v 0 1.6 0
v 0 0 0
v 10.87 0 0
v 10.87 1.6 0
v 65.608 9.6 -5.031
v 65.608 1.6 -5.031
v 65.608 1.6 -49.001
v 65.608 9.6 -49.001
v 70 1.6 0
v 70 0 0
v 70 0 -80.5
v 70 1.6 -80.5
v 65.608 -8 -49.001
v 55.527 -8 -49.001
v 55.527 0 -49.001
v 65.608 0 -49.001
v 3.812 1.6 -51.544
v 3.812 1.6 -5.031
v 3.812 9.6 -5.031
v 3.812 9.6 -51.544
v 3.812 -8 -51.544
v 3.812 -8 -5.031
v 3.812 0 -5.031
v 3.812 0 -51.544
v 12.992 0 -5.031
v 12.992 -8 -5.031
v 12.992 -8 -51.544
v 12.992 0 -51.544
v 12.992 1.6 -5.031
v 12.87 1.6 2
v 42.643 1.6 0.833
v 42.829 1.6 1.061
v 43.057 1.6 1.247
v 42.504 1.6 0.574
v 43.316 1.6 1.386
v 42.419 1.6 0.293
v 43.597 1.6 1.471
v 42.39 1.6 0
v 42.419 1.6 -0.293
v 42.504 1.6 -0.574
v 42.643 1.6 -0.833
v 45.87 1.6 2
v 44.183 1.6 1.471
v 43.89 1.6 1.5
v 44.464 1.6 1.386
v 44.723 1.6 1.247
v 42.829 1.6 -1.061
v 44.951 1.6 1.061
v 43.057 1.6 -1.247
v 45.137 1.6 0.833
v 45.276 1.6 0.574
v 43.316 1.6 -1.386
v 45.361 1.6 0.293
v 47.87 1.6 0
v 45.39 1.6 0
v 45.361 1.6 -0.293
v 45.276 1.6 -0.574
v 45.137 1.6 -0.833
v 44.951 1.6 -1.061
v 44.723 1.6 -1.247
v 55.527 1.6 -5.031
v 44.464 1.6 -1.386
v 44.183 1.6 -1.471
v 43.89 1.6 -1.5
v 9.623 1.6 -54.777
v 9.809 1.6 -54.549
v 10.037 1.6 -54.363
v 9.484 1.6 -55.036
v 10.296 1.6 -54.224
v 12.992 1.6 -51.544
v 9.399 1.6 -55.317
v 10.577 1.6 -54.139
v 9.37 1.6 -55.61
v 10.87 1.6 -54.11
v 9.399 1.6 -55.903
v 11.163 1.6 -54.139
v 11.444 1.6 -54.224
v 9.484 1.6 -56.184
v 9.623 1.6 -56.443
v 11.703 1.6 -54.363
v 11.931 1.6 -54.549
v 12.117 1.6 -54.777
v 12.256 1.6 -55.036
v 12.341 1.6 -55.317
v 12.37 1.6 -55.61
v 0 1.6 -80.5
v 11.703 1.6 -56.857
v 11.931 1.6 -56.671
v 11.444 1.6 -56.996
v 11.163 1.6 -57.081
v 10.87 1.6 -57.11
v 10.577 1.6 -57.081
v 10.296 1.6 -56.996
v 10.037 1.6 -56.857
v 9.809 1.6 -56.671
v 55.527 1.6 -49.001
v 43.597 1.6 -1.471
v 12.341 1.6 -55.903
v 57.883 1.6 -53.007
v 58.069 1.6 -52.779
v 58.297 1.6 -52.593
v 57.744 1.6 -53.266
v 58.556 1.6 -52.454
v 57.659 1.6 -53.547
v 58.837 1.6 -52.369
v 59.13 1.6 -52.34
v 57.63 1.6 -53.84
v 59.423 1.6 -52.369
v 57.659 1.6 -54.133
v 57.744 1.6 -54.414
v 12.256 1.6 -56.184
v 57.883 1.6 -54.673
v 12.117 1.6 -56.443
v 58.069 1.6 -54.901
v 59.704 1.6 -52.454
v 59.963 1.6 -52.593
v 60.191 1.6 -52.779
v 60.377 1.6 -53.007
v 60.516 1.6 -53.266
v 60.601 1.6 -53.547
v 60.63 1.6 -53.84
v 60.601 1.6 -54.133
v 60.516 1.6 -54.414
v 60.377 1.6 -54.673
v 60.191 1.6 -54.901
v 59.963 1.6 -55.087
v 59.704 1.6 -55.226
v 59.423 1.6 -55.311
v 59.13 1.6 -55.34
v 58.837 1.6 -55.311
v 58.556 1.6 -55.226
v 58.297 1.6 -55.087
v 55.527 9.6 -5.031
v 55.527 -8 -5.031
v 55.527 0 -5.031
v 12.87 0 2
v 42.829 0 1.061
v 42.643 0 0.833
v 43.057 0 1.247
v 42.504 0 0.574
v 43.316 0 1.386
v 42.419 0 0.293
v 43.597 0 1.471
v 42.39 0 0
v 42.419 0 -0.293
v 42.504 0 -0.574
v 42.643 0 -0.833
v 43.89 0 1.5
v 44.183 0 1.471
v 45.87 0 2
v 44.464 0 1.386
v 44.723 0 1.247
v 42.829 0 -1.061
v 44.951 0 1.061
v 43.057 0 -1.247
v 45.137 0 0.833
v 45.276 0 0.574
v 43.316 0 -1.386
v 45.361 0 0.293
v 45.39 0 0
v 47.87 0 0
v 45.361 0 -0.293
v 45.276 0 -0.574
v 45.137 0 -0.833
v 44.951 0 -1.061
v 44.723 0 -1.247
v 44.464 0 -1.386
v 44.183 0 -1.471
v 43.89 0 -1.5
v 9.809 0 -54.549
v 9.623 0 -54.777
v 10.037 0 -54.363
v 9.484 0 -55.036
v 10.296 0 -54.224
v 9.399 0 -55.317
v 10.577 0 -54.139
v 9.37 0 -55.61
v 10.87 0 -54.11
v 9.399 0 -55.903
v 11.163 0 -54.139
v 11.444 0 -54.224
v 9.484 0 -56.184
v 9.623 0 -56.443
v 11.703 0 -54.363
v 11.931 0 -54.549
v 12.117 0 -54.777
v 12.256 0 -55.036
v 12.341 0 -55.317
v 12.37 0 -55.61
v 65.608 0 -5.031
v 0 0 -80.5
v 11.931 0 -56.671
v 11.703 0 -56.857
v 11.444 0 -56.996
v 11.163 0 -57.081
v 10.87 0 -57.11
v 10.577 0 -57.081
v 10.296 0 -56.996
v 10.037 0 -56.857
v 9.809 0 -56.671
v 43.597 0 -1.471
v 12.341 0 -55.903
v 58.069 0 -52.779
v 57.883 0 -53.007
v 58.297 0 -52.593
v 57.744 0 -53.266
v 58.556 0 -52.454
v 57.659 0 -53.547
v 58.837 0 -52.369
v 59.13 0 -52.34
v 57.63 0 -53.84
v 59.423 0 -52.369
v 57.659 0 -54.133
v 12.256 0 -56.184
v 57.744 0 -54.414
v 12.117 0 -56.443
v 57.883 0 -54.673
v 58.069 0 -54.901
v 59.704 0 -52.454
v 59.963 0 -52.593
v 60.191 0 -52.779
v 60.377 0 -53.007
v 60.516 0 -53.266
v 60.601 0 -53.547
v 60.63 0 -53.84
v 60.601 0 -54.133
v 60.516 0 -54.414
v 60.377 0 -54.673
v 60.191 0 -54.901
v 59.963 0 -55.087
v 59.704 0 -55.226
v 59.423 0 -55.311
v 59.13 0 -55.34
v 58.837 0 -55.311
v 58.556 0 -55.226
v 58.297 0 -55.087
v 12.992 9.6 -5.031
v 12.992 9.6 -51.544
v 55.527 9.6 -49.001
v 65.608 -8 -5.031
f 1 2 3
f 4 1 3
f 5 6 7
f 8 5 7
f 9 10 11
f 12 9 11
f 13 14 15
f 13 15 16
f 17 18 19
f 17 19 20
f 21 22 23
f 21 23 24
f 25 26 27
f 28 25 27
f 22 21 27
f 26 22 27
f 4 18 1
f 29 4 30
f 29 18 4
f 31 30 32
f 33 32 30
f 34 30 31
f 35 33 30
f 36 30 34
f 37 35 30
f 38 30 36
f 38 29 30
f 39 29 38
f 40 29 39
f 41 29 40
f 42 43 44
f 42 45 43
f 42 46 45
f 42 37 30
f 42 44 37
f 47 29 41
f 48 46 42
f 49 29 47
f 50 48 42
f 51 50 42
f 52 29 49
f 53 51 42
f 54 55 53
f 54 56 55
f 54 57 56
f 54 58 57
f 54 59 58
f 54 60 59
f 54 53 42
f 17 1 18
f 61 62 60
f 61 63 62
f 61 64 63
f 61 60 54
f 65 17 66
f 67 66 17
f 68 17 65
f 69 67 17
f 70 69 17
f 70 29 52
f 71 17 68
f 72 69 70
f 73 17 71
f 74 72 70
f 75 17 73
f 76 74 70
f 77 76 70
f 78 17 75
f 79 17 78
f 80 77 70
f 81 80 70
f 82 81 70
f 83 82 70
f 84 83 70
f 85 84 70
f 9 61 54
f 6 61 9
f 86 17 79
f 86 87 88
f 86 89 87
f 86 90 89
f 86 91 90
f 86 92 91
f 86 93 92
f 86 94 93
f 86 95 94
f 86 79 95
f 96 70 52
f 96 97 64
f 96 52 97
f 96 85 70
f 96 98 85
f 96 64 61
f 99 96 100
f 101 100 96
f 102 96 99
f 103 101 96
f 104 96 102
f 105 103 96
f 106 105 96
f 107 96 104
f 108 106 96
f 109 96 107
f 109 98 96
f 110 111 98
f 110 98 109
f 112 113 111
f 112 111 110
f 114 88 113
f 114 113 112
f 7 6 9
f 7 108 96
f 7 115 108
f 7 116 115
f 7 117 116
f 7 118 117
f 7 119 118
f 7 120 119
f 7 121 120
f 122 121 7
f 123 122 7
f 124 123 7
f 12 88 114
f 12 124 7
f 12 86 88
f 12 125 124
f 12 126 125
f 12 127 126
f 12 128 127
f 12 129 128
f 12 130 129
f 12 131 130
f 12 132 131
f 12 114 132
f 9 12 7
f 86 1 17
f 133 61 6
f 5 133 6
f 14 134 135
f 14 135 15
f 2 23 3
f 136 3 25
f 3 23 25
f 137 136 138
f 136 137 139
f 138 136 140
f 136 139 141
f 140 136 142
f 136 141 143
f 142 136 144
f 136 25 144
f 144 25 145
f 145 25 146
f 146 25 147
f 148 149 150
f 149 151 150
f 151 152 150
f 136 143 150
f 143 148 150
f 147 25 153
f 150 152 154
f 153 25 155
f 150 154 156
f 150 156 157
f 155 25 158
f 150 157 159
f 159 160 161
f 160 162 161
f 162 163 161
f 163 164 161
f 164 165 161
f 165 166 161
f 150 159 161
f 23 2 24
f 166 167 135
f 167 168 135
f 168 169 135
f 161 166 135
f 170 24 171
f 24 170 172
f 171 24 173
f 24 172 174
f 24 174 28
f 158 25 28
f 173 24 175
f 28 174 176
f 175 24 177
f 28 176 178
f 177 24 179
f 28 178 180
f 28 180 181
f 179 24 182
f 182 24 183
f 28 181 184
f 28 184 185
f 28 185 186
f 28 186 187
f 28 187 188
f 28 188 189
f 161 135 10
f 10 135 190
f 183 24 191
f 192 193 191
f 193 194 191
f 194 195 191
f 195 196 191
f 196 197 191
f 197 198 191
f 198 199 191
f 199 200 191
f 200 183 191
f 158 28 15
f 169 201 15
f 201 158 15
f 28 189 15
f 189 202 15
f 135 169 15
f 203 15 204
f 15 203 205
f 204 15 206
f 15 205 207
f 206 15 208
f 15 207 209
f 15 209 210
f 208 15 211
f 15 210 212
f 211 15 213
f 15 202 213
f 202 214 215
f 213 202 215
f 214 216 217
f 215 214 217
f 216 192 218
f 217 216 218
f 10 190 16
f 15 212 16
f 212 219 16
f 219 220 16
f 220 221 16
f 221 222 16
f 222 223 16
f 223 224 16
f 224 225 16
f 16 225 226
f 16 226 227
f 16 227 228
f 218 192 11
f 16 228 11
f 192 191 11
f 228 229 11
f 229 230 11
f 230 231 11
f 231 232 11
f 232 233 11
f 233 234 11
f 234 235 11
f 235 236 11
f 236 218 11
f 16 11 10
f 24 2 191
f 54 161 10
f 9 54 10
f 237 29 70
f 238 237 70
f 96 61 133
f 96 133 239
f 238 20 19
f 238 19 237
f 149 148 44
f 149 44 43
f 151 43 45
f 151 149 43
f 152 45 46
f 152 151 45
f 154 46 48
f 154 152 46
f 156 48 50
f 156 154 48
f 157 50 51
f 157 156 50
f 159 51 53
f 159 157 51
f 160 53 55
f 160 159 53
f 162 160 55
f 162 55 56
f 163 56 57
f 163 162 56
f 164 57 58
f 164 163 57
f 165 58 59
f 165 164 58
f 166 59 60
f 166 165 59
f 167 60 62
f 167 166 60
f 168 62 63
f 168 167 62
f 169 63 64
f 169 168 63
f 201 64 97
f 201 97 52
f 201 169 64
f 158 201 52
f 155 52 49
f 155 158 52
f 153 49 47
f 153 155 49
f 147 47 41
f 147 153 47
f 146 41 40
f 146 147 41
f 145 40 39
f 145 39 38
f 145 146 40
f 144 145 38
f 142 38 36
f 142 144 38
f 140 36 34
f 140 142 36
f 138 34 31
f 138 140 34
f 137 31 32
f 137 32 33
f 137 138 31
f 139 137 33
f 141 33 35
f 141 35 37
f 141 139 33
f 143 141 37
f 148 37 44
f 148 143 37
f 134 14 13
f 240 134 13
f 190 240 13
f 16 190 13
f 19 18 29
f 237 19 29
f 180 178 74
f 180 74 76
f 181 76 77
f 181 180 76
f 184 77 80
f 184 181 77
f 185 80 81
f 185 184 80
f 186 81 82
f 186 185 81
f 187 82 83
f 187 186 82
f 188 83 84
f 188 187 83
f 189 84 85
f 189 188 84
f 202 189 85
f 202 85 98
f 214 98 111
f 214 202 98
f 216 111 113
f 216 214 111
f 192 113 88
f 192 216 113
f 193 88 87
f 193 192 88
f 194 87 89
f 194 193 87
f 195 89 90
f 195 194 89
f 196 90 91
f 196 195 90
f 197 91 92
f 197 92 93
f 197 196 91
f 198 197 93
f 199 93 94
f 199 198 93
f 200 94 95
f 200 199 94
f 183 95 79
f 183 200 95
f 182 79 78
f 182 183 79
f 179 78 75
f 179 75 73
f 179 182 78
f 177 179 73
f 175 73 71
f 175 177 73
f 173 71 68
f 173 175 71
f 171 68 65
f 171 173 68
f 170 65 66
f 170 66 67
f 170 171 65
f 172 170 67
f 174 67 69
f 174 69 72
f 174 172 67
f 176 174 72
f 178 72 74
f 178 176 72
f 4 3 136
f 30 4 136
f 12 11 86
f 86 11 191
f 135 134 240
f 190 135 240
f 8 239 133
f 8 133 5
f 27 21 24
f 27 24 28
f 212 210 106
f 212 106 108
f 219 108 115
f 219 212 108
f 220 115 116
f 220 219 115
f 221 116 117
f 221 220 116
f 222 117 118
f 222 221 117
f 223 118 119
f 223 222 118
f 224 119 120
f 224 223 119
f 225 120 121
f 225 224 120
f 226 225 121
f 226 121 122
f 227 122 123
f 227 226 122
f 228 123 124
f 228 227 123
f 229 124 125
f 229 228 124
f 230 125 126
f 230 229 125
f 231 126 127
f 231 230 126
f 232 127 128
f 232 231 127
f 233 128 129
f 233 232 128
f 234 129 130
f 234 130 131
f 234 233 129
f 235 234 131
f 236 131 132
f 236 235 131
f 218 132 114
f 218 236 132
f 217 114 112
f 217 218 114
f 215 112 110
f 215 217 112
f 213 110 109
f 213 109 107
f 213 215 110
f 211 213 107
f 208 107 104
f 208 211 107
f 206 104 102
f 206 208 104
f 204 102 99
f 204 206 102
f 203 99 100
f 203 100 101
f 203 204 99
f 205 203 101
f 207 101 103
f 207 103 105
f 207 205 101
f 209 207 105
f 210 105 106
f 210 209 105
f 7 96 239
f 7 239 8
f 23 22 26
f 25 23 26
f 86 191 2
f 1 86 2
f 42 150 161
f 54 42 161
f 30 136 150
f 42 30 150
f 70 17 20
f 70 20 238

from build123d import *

# Parameters (mm, degrees)
SKETCH1_R                = 1.5
BOSS_EXTRUDE1_DEPTH      = 1.6
BOSS_EXTRUDE2_DEPTH      = 8
BOSS_EXTRUDE2_DEPTH_BACK = 9.6
SKETCH2_W                = 9.179453462
SKETCH2_H                = 46.512773029
SKETCH2_W_2              = 10.081020205
SKETCH2_H_2              = 43.969790628


with BuildPart() as part:
    # Sketch1 → Boss-Extrude1 (new body)
    with BuildSketch(Plane(origin=(0, 0, 0), x_dir=(1, 0, 0), z_dir=(0, 1, 0))):
        Polygon((0, 0), (10.87, 0), (12.87, -2), (45.87, -2), (47.87, 0), (70, 0), (70, 80.5), (0, 80.5), align=None)
        with Locations(Location((10.87, 55.61, 0), (0, 0, 270))):
            Circle(SKETCH1_R, mode=Mode.SUBTRACT)
        with Locations(Location((59.13, 53.84, 0), (0, 0, 270))):
            Circle(SKETCH1_R, mode=Mode.SUBTRACT)
        with Locations(Location((43.89, 0, 0), (0, 0, 270))):
            Circle(SKETCH1_R, mode=Mode.SUBTRACT)
    extrude(amount=BOSS_EXTRUDE1_DEPTH)

    # Sketch2 → Boss-Extrude2 (add, two sides: drawn at the far end of the back side and taken through both)
    with BuildSketch(Plane(origin=(0, 1.6, 0), x_dir=(1, 0, 0), z_dir=(0, 1, 0)).offset(-BOSS_EXTRUDE2_DEPTH_BACK)):
        with Locations((8.40218686, 28.287509228)):
            Rectangle(SKETCH2_W, SKETCH2_H)
        with Locations((60.567754225, 27.016018028)):
            Rectangle(SKETCH2_W_2, SKETCH2_H_2)
    extrude(amount=BOSS_EXTRUDE2_DEPTH + BOSS_EXTRUDE2_DEPTH_BACK)


solid = part.part
